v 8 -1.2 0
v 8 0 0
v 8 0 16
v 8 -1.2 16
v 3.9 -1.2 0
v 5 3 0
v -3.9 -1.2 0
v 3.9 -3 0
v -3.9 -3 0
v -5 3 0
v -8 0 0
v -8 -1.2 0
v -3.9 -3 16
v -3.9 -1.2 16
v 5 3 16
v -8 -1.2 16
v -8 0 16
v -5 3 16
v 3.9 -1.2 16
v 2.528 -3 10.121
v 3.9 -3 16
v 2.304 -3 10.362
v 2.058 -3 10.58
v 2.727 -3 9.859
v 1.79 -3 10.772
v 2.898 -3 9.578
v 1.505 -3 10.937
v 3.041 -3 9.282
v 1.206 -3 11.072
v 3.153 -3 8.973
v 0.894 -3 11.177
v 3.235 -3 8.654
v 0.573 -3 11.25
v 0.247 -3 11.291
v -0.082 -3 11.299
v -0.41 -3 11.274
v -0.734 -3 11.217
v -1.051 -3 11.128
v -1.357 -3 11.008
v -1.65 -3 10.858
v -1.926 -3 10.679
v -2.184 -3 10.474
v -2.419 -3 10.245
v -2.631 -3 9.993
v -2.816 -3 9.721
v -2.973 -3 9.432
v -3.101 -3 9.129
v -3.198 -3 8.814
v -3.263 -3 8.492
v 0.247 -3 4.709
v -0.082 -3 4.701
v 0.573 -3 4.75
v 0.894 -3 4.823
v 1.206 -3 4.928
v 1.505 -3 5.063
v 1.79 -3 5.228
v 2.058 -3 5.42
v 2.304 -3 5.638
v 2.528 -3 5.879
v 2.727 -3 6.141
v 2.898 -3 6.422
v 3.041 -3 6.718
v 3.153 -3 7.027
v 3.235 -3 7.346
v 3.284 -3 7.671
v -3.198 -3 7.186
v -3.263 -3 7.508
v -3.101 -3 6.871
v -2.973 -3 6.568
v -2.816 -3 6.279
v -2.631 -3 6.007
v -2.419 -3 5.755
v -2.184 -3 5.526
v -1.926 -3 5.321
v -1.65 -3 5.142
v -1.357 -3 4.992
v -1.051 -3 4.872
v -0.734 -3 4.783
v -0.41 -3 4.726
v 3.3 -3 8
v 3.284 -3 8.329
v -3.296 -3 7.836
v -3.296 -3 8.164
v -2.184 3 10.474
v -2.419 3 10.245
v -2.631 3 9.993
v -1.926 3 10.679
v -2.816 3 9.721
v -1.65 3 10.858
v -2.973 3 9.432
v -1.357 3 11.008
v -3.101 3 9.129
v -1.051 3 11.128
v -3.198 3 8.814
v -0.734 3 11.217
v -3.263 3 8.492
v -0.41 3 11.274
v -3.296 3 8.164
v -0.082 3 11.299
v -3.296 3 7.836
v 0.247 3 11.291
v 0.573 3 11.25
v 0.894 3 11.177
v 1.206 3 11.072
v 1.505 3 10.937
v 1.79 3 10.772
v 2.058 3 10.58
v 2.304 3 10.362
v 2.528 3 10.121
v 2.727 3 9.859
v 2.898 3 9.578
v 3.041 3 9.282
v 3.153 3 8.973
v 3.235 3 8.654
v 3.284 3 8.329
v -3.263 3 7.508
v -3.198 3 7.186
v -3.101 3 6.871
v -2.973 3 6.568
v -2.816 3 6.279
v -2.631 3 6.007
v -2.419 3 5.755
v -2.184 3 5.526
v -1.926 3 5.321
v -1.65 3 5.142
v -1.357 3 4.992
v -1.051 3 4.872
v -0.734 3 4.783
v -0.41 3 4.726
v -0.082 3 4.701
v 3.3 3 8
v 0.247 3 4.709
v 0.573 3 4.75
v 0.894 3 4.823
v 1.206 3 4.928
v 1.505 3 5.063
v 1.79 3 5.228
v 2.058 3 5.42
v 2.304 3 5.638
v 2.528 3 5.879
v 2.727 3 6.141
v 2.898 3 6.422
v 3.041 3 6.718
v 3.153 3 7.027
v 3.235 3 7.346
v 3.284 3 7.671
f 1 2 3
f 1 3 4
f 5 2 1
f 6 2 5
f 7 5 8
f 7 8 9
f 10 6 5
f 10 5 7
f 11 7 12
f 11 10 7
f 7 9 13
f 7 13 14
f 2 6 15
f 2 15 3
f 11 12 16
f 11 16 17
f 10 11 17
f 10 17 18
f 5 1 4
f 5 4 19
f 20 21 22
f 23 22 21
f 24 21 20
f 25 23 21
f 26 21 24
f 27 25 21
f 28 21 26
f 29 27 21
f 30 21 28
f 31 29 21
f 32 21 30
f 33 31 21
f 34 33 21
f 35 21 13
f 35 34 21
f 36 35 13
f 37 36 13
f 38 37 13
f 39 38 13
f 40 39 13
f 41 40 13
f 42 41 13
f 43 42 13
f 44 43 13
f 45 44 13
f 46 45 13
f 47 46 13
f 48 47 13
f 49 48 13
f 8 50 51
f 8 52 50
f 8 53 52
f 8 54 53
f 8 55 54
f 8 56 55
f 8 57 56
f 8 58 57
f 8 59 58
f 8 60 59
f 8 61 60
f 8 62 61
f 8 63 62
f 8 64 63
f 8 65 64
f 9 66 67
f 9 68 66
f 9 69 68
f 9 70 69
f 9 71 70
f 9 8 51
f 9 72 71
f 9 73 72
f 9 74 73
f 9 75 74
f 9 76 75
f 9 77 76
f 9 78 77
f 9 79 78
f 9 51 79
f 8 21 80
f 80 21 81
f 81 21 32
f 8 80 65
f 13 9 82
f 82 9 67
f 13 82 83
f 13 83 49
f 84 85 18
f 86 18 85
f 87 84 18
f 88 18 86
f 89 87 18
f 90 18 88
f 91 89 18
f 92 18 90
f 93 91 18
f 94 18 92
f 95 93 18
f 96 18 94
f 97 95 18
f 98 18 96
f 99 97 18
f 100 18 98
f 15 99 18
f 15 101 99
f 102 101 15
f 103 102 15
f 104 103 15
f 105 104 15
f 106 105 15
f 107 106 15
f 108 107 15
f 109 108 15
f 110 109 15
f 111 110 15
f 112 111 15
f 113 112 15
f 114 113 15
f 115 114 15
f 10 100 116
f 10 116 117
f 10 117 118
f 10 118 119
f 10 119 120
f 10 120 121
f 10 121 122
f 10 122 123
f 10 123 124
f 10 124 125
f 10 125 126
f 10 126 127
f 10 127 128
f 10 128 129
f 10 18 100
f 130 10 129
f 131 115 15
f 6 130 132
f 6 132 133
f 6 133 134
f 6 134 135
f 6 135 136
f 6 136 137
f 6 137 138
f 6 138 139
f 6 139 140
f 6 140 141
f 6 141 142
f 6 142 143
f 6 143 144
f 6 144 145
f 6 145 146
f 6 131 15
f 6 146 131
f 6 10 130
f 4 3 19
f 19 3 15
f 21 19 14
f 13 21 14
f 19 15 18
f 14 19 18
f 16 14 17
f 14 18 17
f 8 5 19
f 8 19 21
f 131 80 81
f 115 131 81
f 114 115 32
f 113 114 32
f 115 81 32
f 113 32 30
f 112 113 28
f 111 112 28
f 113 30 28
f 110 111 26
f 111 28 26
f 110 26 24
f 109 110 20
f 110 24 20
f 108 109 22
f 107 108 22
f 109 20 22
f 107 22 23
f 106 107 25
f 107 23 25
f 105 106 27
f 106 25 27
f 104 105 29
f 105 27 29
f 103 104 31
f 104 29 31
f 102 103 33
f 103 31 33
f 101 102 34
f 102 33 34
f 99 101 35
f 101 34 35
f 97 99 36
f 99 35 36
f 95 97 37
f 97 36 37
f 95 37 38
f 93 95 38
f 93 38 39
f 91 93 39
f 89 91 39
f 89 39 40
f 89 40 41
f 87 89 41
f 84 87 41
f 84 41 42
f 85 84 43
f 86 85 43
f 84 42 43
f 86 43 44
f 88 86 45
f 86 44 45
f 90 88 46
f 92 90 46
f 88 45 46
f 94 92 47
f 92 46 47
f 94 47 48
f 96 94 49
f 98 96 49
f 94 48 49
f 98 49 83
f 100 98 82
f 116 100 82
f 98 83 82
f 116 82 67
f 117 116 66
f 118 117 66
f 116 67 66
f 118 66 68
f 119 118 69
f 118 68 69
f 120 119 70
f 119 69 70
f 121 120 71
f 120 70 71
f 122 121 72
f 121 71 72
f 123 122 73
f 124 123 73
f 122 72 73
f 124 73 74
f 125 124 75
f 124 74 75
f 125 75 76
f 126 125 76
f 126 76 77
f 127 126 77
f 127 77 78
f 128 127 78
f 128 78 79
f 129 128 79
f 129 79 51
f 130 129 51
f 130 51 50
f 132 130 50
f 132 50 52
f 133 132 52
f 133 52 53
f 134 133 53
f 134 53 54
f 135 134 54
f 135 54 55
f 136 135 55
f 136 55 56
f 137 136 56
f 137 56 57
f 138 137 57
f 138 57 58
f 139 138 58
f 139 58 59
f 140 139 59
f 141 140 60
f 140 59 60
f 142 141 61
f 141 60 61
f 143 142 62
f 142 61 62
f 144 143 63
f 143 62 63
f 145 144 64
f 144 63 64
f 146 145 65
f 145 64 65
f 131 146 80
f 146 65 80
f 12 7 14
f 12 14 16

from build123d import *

# Parameters (mm, degrees)
PAD002_DEPTH   = 16
SKETCH005_R    = 3.3
HOLE002_DEPTH  = 6
HOLE002_TIPS_R = 3.3


with BuildPart() as part:
    # Sketch004 → Pad002 (new body)
    with BuildSketch(Plane.XY):
        Polygon((-5, 3), (5, 3), (8, 0), (8, -1.2), (3.9, -1.2), (3.9, -3), (-3.9, -3), (-3.9, -1.2), (-8, -1.2), (-8, 0), align=None)
    extrude(amount=PAD002_DEPTH)

    # Sketch005 (on Face6 of Pad002) → Hole002 (cut)
    with BuildSketch(Plane.XZ.offset(3)):
        with Locations((0, 8)):
            Circle(SKETCH005_R)
    extrude(amount=-HOLE002_DEPTH, mode=Mode.SUBTRACT)

    # Hole002 tips → Hole002 tip 1 section 0
    with BuildSketch(Plane.XZ.offset(-3), mode=Mode.PRIVATE) as hole002_tip_1_s0:
        with Locations((0, 8)):
            Circle(HOLE002_TIPS_R)
    loft([hole002_tip_1_s0.sketch, Vertex(0, 4.98284, 8)], mode=Mode.SUBTRACT)


solid = part.part
